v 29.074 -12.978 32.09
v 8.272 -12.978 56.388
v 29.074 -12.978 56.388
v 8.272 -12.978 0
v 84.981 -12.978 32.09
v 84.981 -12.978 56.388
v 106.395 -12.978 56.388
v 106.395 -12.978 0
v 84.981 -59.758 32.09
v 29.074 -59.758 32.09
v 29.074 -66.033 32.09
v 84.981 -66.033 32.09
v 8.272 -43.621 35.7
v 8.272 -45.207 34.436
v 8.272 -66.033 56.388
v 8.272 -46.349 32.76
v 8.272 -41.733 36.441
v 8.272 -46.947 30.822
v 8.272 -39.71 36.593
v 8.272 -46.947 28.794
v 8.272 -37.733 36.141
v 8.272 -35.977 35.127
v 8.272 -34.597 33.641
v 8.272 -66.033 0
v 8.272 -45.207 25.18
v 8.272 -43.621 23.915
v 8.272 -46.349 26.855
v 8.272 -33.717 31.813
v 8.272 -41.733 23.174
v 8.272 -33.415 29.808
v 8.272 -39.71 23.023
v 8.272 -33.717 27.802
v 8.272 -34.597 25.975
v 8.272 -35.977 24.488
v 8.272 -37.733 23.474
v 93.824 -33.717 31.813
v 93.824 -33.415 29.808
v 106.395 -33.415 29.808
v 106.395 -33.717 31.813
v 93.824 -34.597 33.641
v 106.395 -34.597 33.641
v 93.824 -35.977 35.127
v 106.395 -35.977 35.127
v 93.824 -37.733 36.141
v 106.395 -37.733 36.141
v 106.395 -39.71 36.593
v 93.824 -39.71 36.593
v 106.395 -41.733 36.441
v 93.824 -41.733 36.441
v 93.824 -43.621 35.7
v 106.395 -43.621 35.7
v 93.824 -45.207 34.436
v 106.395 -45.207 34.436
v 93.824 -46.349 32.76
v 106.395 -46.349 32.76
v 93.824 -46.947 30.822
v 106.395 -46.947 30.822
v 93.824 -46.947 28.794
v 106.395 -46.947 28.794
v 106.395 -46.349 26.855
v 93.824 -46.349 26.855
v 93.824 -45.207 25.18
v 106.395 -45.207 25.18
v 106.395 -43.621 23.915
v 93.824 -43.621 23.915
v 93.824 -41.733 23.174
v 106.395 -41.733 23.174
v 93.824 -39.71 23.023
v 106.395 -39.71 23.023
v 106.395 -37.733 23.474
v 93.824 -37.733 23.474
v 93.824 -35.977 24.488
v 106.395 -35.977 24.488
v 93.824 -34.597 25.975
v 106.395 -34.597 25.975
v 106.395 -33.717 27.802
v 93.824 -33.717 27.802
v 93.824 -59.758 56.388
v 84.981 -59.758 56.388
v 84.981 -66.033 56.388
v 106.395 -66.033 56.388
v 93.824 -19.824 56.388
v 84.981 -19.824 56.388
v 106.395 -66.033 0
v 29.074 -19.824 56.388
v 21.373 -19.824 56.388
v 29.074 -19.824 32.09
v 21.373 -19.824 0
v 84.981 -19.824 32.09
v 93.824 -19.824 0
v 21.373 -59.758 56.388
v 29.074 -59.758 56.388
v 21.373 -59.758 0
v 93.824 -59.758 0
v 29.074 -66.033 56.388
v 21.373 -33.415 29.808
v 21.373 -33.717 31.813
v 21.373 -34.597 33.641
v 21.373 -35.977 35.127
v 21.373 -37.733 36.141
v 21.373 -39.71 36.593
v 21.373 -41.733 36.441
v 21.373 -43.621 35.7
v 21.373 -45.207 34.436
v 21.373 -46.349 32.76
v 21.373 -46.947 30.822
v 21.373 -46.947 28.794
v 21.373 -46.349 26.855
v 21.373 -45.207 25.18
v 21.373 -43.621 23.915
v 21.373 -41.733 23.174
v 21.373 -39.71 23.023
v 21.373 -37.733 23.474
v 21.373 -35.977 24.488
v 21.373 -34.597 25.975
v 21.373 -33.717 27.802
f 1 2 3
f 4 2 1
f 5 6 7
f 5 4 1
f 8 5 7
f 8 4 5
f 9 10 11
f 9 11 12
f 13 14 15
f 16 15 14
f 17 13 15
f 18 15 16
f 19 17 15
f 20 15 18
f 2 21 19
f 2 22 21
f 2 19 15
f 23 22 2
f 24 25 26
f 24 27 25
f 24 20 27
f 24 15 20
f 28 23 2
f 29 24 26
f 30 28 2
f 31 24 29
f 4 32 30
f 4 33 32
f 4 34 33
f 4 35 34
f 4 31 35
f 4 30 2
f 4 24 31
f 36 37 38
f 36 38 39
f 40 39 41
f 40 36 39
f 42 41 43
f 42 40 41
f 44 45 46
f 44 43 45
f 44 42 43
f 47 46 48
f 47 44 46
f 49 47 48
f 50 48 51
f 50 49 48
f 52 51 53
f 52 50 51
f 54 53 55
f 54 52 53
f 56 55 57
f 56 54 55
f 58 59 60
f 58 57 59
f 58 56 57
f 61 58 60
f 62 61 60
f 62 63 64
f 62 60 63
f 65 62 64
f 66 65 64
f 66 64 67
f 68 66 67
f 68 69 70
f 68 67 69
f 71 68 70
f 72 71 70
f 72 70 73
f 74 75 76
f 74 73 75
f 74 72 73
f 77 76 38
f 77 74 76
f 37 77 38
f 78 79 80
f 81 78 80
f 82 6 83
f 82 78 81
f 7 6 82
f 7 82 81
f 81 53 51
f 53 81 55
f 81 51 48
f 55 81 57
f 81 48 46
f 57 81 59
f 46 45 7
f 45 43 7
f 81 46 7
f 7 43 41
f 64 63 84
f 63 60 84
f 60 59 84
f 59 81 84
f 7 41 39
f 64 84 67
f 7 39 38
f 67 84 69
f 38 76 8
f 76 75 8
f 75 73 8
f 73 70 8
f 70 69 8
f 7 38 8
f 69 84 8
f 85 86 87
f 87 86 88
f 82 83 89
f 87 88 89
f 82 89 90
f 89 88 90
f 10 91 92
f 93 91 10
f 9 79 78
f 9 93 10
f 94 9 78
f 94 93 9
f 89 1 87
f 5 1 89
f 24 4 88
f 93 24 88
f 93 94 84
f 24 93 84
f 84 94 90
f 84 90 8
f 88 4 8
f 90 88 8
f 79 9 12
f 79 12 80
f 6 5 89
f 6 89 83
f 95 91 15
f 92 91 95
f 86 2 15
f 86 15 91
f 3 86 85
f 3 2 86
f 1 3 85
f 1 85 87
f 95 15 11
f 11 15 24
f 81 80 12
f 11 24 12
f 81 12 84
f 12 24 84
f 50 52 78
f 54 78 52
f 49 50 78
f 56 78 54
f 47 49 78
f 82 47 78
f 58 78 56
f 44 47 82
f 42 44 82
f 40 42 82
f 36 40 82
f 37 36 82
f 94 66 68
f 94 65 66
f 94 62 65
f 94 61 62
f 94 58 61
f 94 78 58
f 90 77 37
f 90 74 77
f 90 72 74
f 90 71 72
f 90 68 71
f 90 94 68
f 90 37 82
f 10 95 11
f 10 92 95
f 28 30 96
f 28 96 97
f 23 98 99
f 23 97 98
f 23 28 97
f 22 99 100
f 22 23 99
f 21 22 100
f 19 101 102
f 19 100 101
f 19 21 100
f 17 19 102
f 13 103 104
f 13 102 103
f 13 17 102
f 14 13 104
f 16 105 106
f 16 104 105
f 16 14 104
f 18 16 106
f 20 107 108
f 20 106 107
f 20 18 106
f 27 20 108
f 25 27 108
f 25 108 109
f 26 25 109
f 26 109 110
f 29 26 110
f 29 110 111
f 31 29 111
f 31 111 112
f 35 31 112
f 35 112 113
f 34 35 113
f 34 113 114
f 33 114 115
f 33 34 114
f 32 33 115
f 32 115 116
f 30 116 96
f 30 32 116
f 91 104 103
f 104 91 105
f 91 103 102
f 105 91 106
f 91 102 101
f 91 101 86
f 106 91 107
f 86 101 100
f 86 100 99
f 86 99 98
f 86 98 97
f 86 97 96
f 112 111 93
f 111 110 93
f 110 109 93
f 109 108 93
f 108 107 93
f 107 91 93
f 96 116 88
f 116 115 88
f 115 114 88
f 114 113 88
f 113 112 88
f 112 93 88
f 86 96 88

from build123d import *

# Parameters (mm, degrees)
F0_W     = 98.122775
F0_H     = 53.054758
F1_DEPTH = 56.388
F2_W     = 72.451114
F2_H     = 39.933689
F3_DEPTH = 56.389
F4_R     = 6.804049
F5_DEPTH = 106.39576
F7_DEPTH = 101.6


with BuildPart() as f1:
    # F0 (on Top) → F1 (new body)
    with BuildSketch(Plane.XY):
        with Locations((57.333372, -39.505832)):
            Rectangle(F0_W, F0_H)
    extrude(amount=F1_DEPTH)

    # F2 (on Top) → F3 (cut, through all)
    with BuildSketch(Plane.XY):
        with Locations((57.598237, -39.791069)):
            Rectangle(F2_W, F2_H)
    extrude(amount=F3_DEPTH, mode=Mode.SUBTRACT)

    # F4 (on Right) → F5 (cut, through all)
    with BuildSketch(Plane.YZ):
        with Locations((-40.218931, 29.807648)):
            Circle(F4_R)
    extrude(amount=F5_DEPTH, mode=Mode.SUBTRACT)

    # F6 (on Front) → F7 (cut)
    with BuildSketch(Plane.XZ):
        Polygon((84.981345, 64.892247), (40.198553, 62.610321), (29.074172, 62.610321), (29.074172, 32.089572), (84.981345, 32.089572), align=None)
    extrude(amount=F7_DEPTH, mode=Mode.SUBTRACT)


solid = f1.part
